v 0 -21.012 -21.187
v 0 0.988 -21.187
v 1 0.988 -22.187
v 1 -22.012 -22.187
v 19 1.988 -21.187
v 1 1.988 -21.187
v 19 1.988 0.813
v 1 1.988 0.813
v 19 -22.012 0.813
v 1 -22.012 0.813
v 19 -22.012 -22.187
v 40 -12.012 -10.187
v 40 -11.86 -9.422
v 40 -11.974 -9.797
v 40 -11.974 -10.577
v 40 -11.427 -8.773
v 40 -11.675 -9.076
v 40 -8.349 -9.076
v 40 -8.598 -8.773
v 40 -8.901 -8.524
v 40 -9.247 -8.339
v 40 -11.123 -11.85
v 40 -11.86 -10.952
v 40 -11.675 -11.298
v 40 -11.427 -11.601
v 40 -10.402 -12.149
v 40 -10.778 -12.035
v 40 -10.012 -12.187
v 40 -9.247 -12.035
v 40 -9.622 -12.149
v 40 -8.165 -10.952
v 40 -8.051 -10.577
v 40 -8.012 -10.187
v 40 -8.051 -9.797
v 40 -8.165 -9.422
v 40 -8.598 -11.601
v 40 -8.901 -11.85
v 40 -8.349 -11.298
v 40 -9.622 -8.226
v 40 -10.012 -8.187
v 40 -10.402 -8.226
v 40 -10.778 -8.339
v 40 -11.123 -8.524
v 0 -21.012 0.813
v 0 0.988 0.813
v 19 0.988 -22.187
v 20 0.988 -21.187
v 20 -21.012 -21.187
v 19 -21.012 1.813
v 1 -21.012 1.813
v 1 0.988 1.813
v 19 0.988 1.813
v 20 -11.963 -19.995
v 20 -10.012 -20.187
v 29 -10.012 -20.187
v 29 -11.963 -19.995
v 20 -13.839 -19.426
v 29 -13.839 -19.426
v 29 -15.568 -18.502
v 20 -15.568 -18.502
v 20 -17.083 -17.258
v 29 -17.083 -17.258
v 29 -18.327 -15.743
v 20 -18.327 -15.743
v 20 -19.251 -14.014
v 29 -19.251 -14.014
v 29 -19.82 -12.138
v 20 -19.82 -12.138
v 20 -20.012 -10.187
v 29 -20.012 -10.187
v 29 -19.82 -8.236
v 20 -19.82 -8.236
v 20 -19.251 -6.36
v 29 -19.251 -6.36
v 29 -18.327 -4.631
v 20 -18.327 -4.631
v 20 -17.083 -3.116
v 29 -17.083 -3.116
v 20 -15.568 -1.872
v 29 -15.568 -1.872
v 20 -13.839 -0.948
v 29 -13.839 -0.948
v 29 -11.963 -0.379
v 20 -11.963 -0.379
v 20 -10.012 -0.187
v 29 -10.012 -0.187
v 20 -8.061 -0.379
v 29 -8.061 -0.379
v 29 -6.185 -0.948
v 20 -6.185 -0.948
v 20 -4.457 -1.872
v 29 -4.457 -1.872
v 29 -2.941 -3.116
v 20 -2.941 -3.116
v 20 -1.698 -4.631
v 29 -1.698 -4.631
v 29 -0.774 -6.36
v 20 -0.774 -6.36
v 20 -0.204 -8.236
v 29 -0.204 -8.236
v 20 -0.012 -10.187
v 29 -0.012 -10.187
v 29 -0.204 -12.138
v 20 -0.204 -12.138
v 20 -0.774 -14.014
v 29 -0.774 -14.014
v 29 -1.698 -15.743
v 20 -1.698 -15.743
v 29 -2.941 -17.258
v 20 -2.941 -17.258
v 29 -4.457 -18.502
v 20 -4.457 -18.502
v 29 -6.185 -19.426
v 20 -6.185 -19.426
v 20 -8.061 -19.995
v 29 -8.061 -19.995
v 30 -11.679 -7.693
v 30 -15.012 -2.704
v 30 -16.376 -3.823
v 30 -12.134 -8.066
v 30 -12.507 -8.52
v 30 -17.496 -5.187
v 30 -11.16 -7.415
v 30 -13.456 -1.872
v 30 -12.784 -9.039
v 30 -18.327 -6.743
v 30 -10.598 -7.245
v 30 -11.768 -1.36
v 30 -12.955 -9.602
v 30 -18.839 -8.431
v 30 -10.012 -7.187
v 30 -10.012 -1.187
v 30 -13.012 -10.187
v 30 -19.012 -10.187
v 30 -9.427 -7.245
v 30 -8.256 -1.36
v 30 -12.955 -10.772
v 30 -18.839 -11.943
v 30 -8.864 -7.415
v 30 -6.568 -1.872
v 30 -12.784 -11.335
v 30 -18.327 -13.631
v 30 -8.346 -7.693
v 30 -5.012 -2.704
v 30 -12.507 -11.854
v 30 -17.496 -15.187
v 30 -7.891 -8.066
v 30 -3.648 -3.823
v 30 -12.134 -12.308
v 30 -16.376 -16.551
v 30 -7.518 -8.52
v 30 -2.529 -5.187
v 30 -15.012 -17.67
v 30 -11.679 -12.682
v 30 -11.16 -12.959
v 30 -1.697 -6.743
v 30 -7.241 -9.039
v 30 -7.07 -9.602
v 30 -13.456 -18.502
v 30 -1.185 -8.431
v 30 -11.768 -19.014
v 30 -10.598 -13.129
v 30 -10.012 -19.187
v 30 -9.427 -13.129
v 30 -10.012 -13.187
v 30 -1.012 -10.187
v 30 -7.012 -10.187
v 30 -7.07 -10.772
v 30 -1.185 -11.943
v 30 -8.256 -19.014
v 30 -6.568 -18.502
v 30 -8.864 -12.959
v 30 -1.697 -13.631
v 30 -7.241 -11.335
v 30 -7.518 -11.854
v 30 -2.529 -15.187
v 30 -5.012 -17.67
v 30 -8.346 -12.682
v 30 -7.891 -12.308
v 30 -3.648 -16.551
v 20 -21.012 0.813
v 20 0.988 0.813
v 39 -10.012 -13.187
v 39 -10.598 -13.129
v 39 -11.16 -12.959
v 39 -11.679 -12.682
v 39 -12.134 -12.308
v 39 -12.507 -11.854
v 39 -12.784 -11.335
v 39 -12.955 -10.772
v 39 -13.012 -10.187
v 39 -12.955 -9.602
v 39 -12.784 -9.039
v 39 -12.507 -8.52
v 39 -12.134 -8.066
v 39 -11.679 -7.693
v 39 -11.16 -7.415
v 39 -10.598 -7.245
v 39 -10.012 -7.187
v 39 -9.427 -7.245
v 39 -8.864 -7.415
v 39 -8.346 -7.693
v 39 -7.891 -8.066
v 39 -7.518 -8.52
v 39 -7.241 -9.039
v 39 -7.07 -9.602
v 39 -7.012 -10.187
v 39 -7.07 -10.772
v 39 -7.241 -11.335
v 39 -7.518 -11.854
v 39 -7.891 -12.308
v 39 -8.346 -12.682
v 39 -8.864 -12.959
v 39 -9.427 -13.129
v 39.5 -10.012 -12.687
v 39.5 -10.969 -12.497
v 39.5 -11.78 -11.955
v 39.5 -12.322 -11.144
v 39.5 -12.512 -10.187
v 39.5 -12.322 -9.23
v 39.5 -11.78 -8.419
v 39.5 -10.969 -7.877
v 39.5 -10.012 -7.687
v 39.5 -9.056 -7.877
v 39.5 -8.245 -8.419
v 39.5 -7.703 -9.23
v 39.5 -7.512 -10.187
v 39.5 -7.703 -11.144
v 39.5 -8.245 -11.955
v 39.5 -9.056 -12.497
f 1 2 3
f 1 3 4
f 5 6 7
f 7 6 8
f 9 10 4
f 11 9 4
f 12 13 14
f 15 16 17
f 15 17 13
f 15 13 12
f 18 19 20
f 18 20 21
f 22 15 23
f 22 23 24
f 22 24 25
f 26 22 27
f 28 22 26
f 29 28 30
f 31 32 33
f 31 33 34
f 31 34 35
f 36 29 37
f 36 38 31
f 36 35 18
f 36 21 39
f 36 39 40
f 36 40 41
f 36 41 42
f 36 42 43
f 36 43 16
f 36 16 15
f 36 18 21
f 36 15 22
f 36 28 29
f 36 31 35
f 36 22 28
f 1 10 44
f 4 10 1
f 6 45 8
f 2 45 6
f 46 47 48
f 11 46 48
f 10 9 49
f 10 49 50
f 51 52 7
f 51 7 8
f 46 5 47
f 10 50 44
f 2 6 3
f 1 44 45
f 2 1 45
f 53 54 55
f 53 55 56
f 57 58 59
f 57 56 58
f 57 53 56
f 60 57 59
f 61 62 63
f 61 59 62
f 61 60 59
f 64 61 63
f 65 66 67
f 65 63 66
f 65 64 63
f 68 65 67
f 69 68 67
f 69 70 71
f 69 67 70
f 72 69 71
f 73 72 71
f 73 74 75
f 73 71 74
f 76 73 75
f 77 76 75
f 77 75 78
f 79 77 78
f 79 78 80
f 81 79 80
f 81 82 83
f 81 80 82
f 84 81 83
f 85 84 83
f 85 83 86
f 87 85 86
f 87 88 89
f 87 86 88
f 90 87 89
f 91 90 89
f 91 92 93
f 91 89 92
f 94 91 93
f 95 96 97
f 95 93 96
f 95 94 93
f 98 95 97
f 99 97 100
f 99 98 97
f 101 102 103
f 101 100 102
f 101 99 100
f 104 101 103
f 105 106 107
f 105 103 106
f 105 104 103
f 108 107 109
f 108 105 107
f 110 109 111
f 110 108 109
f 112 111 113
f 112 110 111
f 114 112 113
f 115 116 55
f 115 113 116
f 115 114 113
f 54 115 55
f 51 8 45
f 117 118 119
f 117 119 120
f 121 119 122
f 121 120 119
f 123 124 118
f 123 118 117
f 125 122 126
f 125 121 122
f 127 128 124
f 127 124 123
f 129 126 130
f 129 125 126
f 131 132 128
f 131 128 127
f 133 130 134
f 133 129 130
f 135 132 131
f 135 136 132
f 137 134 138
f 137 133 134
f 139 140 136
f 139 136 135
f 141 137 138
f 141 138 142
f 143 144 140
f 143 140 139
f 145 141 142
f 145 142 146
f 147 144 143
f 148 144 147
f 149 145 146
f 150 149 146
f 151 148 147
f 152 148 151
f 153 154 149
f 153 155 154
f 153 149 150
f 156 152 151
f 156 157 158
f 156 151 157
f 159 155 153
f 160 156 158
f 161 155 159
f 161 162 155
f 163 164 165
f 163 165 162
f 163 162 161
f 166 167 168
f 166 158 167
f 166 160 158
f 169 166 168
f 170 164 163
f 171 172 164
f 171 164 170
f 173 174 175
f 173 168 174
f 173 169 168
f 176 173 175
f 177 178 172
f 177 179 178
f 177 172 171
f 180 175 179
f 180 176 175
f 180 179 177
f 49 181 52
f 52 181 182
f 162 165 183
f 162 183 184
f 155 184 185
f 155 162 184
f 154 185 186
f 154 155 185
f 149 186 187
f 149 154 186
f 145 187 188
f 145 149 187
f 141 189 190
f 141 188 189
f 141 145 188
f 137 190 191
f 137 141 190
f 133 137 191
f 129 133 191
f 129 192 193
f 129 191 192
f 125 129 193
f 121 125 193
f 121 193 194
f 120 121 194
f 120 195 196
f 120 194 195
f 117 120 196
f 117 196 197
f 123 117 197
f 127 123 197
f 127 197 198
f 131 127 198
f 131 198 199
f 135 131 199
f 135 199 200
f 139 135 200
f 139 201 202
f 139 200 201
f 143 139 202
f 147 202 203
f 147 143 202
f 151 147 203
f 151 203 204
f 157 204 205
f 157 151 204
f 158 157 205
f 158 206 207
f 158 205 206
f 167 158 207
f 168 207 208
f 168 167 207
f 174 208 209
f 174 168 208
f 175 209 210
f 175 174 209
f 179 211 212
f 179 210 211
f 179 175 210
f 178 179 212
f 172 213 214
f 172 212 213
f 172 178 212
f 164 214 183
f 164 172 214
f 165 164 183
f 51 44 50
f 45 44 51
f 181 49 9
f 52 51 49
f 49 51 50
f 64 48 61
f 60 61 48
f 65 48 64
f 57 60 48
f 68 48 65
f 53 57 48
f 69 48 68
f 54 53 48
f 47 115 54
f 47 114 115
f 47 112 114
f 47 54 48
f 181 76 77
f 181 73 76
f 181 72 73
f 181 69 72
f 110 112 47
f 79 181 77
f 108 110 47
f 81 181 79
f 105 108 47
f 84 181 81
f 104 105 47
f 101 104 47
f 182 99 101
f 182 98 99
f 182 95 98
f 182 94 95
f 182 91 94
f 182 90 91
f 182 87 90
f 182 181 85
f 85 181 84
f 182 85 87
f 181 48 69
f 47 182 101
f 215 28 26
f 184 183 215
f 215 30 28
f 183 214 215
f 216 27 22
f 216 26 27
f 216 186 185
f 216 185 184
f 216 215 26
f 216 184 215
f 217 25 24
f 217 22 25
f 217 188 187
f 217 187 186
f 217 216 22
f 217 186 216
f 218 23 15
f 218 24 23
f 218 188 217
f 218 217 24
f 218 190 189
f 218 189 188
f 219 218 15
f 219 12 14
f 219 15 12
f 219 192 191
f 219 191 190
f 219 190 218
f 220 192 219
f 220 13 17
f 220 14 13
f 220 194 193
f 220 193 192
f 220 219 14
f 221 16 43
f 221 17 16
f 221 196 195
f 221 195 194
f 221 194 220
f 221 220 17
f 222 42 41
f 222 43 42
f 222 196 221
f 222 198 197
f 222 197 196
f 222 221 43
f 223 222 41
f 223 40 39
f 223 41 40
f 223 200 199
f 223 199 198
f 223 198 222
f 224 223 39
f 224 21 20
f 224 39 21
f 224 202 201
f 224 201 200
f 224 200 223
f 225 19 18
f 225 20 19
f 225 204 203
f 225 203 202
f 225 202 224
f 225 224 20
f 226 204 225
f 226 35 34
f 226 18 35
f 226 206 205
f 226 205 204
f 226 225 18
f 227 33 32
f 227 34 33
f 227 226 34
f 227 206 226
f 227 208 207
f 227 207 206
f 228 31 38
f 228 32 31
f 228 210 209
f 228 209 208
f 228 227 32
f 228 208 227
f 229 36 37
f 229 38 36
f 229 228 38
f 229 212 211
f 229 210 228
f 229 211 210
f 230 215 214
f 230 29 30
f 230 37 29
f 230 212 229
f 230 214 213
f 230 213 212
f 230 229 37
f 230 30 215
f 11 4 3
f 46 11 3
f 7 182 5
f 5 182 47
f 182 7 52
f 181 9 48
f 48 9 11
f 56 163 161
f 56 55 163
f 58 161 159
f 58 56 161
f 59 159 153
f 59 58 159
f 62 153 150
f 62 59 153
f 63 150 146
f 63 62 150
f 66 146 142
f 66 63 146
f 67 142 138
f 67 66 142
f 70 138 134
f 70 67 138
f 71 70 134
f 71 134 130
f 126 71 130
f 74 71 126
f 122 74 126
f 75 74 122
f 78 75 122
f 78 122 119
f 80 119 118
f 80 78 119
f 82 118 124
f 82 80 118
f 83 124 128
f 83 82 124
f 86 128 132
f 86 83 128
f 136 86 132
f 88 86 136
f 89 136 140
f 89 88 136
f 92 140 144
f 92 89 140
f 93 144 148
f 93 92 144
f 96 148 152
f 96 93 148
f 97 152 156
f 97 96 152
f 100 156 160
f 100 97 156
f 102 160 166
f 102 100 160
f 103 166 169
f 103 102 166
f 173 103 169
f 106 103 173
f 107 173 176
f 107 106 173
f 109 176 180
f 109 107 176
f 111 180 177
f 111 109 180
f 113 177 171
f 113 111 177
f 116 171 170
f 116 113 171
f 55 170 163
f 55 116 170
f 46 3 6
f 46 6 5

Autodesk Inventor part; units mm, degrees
ref_plane "YZ Plane" through (0, 0, 0) normal (1, 0, 0) x (0, 1, 0)
ref_plane "XZ Plane" through (0, 0, 0) normal (0, 1, 0) x (-1, 0, 0)
ref_plane "XY Plane" through (0, 0, 0) normal (0, 0, 1) x (1, 0, 0)
sketch "Sketch1" plane through (0, 0, 0) normal (0, 1, 0) x (-1, 0, 0)
  point P0 (0, 0)
sketch "Sketch2" plane through (0, 0, 0) normal (1, 0, 0) x (0, 1, 0)
  line L0 (1.9877, 1.8129) -> (-22.0123, 1.8129)
  line L1 (-22.0123, 1.8129) -> (-22.0123, -22.1871)
  line L2 (-22.0123, -22.1871) -> (1.9877, -22.1871)
  line L3 (1.9877, -22.1871) -> (1.9877, 1.8129)
  point P0 (0, 0)
extrude "Extrusion1" add sketch "Sketch2" along normal blind 20
sketch "Sketch3" plane through (20, 0, 0) normal (1, 0, 0) x (0, 0, -1)
  circle A0 centre (10.1871, -10.0123) radius 10
  line L0 (22.1871, 1.9877) -> (-1.8129, 1.9877) projected
  line L1 (-1.8129, 1.9877) -> (-1.8129, -22.0123) projected
  point P0 (0, 0)
extrude "Extrusion2" add sketch "Sketch3" along normal blind 10
sketch "Sketch4" plane through (30, -10.0123, -10.1871) normal (1, 0, 0) x (0, 0, -1)
  circle A0 centre (0, 0) radius 3
  point P0 (-10.1871, 10.0123)
extrude "Extrusion3" add sketch "Sketch4" along normal blind 10
chamfer "Chamfer1" distance 1 angle 45 13 edges at (0, 1.9877, -10.1871) (10, 1.9877, -22.1871) (20, 1.9877, -10.1871) (10, 1.9877, 1.8129) (20, -10.0123, 1.8129) (20, -10.0123, -22.1871) (30, -10.0123, -0.1871) (40, -10.0123, -7.1871) (0, -10.0123, 1.8129) (10, -22.0123, 1.8129) (20, -22.0123, -10.1871) (0, -10.0123, -22.1871) (0, -22.0123, -10.1871)
sketch "Sketch5" plane through (1, 1.9877, 0.8129) normal (0, 1, 0) x (1, 0, 0)
  point P0 (-1, 0.8129)
properties part number "motor(1 shaft)" material "Steel, Alloy"
